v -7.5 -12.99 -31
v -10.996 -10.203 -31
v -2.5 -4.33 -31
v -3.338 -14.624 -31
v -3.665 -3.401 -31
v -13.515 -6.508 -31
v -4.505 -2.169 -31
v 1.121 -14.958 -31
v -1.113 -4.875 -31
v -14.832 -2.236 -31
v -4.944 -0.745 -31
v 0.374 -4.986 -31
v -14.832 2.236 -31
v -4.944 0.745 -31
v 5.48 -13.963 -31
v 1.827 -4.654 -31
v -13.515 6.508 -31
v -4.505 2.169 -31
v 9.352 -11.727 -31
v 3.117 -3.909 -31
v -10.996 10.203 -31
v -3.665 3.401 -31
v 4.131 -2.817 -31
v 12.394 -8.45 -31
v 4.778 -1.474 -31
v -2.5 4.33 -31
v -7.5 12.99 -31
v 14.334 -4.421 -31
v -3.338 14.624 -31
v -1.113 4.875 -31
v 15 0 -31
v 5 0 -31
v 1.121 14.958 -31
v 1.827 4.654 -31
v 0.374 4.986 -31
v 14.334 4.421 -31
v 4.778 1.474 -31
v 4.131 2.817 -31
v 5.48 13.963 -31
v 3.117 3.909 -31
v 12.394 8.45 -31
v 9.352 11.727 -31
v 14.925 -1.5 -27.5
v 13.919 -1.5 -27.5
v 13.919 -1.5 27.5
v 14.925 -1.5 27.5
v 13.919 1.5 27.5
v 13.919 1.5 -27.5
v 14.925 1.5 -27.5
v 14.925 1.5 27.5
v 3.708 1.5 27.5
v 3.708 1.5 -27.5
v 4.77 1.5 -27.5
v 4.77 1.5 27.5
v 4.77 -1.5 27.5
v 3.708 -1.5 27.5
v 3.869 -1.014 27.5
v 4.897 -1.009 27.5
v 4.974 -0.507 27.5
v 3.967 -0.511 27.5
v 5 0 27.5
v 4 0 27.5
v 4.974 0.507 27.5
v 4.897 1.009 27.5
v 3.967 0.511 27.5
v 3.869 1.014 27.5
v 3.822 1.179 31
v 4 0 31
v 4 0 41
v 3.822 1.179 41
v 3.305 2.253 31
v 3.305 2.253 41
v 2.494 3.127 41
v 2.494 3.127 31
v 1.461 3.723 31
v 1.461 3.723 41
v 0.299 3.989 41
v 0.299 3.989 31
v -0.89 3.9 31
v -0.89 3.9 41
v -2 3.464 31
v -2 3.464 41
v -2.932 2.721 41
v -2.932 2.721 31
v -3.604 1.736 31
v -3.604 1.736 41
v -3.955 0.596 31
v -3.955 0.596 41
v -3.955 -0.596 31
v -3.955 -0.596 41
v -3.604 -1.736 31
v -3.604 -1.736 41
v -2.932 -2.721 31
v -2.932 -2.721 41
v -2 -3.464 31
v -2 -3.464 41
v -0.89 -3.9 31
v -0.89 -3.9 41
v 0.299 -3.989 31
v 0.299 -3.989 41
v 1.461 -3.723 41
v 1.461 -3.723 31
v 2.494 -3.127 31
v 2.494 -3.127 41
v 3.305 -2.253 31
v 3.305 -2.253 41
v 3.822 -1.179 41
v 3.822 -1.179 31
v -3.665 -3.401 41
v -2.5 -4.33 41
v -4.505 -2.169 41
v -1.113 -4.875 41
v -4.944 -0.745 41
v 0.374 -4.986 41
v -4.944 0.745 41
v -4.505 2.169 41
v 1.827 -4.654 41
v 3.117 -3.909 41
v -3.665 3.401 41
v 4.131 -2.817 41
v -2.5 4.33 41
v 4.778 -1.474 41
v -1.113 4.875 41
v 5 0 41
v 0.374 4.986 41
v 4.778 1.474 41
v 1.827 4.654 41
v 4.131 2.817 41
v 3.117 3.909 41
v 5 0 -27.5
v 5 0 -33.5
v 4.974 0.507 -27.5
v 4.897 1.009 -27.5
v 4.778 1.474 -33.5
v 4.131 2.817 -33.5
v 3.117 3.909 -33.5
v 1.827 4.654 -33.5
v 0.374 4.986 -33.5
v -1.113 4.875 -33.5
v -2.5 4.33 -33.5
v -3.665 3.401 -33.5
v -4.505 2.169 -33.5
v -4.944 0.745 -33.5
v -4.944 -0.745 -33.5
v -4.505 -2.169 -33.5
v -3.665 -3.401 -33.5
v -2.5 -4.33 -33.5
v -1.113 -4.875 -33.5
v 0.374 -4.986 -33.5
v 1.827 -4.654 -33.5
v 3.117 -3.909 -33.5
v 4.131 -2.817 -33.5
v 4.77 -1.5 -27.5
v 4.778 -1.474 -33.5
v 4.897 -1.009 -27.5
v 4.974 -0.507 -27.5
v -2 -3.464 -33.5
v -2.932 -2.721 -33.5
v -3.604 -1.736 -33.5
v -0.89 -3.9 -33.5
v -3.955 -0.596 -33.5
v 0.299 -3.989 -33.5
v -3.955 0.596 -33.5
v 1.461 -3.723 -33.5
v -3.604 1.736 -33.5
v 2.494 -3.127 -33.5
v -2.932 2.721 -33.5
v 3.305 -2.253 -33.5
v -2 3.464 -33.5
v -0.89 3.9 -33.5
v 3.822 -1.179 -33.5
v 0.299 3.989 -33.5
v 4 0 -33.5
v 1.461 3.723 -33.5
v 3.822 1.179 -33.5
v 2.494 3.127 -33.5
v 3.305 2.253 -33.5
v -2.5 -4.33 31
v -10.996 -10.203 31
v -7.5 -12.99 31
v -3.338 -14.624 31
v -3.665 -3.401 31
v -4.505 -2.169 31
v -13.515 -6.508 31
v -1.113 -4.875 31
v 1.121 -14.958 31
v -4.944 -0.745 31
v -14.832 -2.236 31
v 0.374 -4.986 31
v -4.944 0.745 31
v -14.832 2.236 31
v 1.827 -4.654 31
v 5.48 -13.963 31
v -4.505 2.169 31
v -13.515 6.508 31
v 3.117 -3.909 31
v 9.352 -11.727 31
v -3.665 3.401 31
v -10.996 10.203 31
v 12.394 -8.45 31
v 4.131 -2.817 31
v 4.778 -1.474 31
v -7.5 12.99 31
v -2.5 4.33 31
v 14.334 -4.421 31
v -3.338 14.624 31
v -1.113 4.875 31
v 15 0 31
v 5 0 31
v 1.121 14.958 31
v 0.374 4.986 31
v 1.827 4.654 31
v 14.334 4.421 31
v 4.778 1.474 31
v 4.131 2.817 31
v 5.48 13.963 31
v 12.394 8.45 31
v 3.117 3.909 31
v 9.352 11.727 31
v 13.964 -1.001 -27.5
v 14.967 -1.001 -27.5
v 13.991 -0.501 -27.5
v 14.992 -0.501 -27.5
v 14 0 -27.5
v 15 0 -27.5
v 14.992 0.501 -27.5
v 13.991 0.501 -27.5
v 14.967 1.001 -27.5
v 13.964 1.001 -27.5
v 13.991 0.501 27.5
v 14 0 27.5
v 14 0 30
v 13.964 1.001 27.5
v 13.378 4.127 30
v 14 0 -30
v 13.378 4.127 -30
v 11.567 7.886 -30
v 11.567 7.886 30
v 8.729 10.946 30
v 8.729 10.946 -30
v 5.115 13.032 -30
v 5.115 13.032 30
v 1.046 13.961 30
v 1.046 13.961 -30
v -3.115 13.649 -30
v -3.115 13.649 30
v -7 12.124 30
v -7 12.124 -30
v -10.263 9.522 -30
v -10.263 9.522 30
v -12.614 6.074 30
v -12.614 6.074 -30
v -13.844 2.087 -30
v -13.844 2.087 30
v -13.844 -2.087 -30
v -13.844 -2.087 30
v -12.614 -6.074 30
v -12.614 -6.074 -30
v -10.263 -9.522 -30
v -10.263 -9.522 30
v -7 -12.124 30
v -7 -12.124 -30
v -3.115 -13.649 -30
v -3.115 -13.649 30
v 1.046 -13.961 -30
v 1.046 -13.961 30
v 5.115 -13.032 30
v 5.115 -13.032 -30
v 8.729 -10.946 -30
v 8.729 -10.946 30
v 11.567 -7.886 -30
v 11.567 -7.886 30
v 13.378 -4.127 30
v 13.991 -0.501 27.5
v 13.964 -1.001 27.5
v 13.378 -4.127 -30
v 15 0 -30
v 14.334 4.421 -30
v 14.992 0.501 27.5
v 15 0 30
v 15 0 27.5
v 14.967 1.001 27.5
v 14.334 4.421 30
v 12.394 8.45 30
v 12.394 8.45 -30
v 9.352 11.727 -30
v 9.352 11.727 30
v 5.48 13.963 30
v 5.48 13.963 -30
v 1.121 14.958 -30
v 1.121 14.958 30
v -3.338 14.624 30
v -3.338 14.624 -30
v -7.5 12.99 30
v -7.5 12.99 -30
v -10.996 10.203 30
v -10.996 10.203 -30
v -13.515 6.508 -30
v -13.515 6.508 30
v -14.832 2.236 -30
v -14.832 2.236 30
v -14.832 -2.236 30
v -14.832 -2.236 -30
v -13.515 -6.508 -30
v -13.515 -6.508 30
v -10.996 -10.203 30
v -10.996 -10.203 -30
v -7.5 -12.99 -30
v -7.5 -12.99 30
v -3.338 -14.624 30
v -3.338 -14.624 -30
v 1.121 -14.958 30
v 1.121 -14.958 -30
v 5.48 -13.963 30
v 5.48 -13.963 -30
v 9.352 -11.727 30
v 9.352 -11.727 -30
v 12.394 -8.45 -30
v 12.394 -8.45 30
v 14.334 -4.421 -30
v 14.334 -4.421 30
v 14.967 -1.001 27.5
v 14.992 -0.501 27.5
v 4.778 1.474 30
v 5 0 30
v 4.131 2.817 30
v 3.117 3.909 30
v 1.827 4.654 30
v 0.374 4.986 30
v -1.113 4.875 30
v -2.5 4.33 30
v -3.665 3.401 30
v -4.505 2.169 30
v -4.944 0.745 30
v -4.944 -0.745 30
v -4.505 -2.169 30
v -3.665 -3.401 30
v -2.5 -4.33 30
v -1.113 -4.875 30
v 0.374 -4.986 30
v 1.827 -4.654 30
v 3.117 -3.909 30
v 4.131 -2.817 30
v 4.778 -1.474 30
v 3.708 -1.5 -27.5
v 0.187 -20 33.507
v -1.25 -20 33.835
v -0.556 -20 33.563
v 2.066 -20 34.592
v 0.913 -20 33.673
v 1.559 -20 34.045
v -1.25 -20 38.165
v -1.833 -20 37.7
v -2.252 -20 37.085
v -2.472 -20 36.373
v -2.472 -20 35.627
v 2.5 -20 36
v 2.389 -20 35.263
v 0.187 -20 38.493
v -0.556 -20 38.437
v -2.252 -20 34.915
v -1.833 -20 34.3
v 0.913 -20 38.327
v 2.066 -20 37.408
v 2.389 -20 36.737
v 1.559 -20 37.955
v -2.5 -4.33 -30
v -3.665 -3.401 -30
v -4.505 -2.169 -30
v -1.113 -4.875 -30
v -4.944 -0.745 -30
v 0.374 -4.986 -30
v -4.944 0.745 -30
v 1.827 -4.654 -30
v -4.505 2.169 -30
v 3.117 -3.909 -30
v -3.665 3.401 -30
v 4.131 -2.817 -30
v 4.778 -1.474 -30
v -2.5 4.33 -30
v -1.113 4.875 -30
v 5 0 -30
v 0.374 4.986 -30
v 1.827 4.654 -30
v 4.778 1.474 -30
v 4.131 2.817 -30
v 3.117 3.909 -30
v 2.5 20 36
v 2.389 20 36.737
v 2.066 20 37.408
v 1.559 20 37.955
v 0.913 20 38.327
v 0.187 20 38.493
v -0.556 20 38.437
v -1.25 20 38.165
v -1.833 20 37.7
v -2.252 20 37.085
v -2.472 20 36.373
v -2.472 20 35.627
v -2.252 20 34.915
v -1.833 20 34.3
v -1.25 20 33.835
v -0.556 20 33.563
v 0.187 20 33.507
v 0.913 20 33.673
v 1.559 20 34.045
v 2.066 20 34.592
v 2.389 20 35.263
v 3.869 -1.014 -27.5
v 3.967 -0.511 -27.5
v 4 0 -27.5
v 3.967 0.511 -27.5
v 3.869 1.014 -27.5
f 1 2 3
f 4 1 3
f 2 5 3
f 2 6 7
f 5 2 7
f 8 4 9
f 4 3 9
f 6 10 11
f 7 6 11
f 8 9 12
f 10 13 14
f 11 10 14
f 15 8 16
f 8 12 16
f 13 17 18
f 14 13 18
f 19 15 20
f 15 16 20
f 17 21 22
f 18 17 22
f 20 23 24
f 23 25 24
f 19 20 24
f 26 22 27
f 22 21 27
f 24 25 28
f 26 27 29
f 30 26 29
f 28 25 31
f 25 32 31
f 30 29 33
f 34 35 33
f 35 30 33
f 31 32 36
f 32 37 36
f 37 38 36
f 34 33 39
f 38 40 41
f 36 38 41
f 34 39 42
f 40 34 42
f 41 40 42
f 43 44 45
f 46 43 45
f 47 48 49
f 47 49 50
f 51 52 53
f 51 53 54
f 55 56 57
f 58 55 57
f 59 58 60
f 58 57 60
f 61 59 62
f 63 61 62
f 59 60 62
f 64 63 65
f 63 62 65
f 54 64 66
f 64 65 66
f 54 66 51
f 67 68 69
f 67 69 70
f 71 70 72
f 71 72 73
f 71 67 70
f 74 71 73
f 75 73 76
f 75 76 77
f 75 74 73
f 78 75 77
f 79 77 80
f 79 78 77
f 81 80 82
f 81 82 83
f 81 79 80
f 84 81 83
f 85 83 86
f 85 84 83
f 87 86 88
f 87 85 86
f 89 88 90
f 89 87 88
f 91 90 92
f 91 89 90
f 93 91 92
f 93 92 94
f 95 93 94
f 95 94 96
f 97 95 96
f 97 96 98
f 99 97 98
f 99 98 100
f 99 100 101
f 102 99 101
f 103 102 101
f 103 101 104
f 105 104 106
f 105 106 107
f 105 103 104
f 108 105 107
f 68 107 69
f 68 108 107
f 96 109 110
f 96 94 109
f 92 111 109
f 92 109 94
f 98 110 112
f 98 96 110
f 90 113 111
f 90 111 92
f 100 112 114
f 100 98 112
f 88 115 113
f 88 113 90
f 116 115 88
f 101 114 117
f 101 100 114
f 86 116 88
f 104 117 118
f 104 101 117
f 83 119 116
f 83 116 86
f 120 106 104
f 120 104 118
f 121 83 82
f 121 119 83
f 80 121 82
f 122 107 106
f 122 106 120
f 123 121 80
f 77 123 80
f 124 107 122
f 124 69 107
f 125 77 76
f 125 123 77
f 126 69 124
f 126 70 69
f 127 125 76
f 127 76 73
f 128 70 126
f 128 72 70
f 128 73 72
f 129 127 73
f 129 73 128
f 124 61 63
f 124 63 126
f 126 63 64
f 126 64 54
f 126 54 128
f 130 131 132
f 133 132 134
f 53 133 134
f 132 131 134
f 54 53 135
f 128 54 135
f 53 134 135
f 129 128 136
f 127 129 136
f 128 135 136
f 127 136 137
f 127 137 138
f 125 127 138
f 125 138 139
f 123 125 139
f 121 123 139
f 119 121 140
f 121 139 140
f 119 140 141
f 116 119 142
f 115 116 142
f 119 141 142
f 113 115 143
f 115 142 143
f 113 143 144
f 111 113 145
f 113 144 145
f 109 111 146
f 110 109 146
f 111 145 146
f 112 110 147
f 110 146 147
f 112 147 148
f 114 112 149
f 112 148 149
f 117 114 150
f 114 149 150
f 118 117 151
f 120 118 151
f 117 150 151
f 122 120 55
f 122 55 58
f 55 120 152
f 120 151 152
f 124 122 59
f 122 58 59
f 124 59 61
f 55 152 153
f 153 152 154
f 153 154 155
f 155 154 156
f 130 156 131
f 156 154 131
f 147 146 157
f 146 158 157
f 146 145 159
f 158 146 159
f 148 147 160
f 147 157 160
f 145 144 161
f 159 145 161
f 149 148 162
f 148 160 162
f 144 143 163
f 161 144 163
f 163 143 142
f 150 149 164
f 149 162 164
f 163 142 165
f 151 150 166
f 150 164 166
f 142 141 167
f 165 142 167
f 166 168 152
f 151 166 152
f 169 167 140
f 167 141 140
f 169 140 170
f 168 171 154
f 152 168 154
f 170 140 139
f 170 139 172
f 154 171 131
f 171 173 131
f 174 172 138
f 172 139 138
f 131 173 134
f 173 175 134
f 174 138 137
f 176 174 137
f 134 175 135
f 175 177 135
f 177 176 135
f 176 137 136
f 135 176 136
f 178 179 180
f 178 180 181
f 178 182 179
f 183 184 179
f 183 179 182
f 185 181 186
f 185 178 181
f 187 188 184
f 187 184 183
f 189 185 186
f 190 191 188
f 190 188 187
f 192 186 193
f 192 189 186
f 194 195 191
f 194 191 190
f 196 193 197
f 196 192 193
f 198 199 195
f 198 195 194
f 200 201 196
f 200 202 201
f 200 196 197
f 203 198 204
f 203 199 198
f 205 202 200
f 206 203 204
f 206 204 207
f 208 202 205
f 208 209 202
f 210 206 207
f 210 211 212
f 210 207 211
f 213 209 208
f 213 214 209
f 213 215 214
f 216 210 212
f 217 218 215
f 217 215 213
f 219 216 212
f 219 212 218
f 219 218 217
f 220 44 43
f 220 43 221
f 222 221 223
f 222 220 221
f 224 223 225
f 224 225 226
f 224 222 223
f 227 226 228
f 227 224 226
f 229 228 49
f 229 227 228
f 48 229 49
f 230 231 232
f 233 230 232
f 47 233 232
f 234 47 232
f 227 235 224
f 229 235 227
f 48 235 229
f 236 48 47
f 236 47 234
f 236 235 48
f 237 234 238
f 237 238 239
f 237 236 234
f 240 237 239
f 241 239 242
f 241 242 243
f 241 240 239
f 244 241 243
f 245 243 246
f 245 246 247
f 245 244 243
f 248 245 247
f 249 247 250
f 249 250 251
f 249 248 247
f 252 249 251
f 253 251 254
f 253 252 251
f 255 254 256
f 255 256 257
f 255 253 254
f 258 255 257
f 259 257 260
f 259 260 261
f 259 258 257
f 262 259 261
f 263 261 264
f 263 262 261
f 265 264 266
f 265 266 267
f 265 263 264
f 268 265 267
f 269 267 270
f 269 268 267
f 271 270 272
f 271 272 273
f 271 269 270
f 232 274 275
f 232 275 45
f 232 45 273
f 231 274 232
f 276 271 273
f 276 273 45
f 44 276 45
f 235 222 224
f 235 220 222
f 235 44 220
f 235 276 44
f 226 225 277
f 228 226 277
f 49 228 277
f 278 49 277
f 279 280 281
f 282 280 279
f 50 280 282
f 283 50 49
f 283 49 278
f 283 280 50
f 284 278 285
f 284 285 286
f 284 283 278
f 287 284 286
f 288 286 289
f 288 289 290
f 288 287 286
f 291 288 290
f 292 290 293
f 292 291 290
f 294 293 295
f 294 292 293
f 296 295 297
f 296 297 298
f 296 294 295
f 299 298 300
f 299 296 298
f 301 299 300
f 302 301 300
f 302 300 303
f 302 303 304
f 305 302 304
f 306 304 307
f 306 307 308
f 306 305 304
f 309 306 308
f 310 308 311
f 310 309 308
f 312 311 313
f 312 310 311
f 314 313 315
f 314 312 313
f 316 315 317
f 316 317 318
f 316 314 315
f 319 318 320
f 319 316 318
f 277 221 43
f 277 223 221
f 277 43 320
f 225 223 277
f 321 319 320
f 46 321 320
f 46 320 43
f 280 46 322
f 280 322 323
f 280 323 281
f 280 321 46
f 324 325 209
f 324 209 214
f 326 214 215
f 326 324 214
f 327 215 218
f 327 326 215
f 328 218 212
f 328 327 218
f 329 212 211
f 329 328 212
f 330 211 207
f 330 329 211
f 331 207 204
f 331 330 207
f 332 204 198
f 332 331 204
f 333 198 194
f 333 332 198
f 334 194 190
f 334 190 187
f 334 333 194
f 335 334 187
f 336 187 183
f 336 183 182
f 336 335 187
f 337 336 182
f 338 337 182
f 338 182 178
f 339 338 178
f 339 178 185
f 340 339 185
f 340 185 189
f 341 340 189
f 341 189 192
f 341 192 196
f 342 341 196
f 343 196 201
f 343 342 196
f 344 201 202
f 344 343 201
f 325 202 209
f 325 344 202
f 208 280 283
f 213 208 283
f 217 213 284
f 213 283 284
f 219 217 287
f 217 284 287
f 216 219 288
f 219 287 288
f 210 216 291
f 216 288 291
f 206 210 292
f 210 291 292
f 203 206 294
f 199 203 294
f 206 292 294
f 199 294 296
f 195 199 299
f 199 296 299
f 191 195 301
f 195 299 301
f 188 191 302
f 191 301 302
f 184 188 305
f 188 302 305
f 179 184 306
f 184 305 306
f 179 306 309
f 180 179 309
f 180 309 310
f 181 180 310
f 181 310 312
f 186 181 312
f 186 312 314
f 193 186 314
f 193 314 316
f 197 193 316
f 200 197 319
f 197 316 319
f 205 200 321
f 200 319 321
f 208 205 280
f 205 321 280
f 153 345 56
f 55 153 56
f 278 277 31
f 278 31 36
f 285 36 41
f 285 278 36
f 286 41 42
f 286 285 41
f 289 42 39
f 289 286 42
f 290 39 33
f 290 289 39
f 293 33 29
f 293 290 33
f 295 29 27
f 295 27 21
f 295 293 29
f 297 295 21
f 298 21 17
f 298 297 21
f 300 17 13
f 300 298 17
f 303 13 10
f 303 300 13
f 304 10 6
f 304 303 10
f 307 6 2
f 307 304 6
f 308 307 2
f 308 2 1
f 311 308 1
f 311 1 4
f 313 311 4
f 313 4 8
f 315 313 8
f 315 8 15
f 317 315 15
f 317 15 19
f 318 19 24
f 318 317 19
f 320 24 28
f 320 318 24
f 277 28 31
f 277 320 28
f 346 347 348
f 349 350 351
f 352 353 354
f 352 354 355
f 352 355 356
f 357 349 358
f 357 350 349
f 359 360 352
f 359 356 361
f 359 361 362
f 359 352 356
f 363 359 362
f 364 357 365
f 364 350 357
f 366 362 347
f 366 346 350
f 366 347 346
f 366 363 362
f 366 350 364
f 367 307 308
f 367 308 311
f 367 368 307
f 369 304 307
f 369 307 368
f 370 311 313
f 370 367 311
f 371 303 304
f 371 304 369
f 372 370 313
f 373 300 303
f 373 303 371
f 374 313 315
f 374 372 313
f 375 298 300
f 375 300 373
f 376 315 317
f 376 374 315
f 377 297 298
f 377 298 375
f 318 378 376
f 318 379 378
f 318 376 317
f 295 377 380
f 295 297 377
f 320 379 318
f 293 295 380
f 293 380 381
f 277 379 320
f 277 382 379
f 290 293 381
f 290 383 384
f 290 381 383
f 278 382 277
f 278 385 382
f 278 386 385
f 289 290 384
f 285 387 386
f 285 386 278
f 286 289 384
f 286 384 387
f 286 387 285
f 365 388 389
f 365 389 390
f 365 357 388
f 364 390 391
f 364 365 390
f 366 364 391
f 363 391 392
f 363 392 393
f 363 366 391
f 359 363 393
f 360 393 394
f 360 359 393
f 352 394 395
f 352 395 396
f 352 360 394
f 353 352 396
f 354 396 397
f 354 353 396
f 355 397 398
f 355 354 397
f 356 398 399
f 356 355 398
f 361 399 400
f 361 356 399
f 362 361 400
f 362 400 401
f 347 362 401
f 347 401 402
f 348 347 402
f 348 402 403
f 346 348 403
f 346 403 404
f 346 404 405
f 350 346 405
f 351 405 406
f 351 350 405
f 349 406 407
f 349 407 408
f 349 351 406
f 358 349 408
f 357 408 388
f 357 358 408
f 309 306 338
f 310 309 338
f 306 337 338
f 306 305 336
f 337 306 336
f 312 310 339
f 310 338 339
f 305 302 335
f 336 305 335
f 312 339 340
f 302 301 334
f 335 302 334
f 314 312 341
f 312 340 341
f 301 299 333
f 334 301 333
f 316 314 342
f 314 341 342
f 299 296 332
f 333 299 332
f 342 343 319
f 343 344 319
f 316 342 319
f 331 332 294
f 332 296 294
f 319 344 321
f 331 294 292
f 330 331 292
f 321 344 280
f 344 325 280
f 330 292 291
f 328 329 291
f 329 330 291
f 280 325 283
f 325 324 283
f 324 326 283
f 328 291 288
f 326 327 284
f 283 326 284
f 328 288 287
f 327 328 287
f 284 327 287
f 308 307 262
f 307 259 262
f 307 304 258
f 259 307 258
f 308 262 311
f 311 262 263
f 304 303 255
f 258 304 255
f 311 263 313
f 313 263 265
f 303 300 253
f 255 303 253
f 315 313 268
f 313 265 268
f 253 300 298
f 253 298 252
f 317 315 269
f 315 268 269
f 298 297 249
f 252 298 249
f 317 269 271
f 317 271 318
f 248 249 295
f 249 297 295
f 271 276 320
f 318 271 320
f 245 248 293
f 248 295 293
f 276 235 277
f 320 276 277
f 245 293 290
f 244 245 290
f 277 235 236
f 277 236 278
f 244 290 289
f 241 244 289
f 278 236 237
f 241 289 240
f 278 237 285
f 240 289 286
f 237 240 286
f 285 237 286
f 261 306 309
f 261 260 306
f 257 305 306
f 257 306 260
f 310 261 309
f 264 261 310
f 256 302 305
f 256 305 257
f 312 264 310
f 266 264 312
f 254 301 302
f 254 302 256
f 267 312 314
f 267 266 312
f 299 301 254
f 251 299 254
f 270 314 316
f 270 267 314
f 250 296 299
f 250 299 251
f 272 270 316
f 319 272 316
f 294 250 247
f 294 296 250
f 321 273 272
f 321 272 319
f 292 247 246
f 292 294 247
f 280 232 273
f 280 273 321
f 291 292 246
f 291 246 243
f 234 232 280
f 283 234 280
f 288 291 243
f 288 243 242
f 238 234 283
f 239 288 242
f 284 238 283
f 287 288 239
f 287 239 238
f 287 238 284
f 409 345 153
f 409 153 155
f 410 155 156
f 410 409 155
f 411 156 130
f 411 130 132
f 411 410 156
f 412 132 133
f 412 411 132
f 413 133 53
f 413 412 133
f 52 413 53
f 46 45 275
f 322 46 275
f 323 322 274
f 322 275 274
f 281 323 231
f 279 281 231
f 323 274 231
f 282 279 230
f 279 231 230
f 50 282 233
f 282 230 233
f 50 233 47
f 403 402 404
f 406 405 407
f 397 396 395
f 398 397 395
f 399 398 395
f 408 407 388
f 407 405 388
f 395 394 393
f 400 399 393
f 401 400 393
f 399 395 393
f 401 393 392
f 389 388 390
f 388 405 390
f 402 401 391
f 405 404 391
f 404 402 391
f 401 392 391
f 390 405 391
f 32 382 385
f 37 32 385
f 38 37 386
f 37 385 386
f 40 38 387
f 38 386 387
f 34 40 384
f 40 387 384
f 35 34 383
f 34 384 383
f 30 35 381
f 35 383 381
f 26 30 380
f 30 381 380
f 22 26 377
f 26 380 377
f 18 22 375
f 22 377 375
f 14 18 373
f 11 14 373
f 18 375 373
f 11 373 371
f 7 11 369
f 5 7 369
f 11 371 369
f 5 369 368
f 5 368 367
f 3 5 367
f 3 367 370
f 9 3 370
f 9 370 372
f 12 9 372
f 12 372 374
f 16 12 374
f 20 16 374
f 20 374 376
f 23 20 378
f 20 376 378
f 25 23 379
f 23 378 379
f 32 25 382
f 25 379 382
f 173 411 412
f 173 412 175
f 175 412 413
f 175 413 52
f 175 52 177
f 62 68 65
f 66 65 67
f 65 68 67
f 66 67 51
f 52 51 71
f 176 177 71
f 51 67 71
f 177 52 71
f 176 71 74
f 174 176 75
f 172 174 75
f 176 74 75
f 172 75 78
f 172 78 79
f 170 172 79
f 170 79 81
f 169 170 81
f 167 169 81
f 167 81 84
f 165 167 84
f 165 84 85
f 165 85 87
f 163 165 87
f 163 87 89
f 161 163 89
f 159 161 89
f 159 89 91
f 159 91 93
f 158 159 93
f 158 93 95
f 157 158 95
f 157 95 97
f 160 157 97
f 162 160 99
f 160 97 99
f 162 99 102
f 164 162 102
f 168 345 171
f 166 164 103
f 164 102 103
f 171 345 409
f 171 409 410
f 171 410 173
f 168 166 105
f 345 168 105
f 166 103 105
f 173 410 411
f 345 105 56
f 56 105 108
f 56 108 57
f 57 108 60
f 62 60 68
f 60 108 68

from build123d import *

# Parameters (mm, degrees)
F0_R          = 15
F0_R_2        = 14
F1_DEPTH      = 30
F2_R          = 15
F2_R_2        = 5
F3_DEPTH      = 1
F5_R          = 5
F5_R_2        = 4
F6_DEPTH      = 64.5
F6_DEPTH_BACK = 10
F7_W          = 3
F7_H          = 55
F8_DEPTH      = 25
F9_R          = 2.5
F10_DEPTH     = 20


with BuildPart() as f1:
    # F0 (on Top) → F1 (new body, symmetric)
    with BuildSketch(Plane.XY):
        Circle(F0_R)
        Circle(F0_R_2, mode=Mode.SUBTRACT)
    extrude(amount=F1_DEPTH, both=True)


with BuildPart() as f3:
    # F2 (on face) → F3 (new body)
    with BuildSketch(Plane.XY.offset(30)):
        Circle(F2_R)
        Circle(F2_R_2, mode=Mode.SUBTRACT)
    extrude(amount=F3_DEPTH)


with BuildPart() as f4_1:
    # F4: instance of F3
    add(f3.part.mirror(Plane.XY))


with BuildPart() as f6:
    # F5 (on face) → F6 (new body, two sides)
    with BuildSketch(Plane.XY.offset(31)) as f6_sk:
        Circle(F5_R)
        Circle(F5_R_2, mode=Mode.SUBTRACT)
    extrude(amount=-F6_DEPTH)
    extrude(f6_sk.sketch, amount=F6_DEPTH_BACK)


with BuildPart() as f8_tool:
    # F7 (on Right) → F8 (new body)
    with BuildSketch(Plane.YZ):
        Rectangle(F7_W, F7_H)
    extrude(amount=F8_DEPTH)


with BuildPart() as f1_1:
    add(f1.part)

    # F8: cut by f8_tool
    add(f8_tool.part, mode=Mode.SUBTRACT)


with BuildPart() as f6_1:
    add(f6.part)

    # F8: cut by f8_tool
    add(f8_tool.part, mode=Mode.SUBTRACT)


with BuildPart() as f10:
    # F9 (on Front) → F10 (new body, symmetric)
    with BuildSketch(Plane.XZ):
        with Locations((0, 36)):
            Circle(F9_R)
    extrude(amount=F10_DEPTH, both=True)


solid = Compound([f3.part, f4_1.part, f1_1.part, f6_1.part, f10.part])
